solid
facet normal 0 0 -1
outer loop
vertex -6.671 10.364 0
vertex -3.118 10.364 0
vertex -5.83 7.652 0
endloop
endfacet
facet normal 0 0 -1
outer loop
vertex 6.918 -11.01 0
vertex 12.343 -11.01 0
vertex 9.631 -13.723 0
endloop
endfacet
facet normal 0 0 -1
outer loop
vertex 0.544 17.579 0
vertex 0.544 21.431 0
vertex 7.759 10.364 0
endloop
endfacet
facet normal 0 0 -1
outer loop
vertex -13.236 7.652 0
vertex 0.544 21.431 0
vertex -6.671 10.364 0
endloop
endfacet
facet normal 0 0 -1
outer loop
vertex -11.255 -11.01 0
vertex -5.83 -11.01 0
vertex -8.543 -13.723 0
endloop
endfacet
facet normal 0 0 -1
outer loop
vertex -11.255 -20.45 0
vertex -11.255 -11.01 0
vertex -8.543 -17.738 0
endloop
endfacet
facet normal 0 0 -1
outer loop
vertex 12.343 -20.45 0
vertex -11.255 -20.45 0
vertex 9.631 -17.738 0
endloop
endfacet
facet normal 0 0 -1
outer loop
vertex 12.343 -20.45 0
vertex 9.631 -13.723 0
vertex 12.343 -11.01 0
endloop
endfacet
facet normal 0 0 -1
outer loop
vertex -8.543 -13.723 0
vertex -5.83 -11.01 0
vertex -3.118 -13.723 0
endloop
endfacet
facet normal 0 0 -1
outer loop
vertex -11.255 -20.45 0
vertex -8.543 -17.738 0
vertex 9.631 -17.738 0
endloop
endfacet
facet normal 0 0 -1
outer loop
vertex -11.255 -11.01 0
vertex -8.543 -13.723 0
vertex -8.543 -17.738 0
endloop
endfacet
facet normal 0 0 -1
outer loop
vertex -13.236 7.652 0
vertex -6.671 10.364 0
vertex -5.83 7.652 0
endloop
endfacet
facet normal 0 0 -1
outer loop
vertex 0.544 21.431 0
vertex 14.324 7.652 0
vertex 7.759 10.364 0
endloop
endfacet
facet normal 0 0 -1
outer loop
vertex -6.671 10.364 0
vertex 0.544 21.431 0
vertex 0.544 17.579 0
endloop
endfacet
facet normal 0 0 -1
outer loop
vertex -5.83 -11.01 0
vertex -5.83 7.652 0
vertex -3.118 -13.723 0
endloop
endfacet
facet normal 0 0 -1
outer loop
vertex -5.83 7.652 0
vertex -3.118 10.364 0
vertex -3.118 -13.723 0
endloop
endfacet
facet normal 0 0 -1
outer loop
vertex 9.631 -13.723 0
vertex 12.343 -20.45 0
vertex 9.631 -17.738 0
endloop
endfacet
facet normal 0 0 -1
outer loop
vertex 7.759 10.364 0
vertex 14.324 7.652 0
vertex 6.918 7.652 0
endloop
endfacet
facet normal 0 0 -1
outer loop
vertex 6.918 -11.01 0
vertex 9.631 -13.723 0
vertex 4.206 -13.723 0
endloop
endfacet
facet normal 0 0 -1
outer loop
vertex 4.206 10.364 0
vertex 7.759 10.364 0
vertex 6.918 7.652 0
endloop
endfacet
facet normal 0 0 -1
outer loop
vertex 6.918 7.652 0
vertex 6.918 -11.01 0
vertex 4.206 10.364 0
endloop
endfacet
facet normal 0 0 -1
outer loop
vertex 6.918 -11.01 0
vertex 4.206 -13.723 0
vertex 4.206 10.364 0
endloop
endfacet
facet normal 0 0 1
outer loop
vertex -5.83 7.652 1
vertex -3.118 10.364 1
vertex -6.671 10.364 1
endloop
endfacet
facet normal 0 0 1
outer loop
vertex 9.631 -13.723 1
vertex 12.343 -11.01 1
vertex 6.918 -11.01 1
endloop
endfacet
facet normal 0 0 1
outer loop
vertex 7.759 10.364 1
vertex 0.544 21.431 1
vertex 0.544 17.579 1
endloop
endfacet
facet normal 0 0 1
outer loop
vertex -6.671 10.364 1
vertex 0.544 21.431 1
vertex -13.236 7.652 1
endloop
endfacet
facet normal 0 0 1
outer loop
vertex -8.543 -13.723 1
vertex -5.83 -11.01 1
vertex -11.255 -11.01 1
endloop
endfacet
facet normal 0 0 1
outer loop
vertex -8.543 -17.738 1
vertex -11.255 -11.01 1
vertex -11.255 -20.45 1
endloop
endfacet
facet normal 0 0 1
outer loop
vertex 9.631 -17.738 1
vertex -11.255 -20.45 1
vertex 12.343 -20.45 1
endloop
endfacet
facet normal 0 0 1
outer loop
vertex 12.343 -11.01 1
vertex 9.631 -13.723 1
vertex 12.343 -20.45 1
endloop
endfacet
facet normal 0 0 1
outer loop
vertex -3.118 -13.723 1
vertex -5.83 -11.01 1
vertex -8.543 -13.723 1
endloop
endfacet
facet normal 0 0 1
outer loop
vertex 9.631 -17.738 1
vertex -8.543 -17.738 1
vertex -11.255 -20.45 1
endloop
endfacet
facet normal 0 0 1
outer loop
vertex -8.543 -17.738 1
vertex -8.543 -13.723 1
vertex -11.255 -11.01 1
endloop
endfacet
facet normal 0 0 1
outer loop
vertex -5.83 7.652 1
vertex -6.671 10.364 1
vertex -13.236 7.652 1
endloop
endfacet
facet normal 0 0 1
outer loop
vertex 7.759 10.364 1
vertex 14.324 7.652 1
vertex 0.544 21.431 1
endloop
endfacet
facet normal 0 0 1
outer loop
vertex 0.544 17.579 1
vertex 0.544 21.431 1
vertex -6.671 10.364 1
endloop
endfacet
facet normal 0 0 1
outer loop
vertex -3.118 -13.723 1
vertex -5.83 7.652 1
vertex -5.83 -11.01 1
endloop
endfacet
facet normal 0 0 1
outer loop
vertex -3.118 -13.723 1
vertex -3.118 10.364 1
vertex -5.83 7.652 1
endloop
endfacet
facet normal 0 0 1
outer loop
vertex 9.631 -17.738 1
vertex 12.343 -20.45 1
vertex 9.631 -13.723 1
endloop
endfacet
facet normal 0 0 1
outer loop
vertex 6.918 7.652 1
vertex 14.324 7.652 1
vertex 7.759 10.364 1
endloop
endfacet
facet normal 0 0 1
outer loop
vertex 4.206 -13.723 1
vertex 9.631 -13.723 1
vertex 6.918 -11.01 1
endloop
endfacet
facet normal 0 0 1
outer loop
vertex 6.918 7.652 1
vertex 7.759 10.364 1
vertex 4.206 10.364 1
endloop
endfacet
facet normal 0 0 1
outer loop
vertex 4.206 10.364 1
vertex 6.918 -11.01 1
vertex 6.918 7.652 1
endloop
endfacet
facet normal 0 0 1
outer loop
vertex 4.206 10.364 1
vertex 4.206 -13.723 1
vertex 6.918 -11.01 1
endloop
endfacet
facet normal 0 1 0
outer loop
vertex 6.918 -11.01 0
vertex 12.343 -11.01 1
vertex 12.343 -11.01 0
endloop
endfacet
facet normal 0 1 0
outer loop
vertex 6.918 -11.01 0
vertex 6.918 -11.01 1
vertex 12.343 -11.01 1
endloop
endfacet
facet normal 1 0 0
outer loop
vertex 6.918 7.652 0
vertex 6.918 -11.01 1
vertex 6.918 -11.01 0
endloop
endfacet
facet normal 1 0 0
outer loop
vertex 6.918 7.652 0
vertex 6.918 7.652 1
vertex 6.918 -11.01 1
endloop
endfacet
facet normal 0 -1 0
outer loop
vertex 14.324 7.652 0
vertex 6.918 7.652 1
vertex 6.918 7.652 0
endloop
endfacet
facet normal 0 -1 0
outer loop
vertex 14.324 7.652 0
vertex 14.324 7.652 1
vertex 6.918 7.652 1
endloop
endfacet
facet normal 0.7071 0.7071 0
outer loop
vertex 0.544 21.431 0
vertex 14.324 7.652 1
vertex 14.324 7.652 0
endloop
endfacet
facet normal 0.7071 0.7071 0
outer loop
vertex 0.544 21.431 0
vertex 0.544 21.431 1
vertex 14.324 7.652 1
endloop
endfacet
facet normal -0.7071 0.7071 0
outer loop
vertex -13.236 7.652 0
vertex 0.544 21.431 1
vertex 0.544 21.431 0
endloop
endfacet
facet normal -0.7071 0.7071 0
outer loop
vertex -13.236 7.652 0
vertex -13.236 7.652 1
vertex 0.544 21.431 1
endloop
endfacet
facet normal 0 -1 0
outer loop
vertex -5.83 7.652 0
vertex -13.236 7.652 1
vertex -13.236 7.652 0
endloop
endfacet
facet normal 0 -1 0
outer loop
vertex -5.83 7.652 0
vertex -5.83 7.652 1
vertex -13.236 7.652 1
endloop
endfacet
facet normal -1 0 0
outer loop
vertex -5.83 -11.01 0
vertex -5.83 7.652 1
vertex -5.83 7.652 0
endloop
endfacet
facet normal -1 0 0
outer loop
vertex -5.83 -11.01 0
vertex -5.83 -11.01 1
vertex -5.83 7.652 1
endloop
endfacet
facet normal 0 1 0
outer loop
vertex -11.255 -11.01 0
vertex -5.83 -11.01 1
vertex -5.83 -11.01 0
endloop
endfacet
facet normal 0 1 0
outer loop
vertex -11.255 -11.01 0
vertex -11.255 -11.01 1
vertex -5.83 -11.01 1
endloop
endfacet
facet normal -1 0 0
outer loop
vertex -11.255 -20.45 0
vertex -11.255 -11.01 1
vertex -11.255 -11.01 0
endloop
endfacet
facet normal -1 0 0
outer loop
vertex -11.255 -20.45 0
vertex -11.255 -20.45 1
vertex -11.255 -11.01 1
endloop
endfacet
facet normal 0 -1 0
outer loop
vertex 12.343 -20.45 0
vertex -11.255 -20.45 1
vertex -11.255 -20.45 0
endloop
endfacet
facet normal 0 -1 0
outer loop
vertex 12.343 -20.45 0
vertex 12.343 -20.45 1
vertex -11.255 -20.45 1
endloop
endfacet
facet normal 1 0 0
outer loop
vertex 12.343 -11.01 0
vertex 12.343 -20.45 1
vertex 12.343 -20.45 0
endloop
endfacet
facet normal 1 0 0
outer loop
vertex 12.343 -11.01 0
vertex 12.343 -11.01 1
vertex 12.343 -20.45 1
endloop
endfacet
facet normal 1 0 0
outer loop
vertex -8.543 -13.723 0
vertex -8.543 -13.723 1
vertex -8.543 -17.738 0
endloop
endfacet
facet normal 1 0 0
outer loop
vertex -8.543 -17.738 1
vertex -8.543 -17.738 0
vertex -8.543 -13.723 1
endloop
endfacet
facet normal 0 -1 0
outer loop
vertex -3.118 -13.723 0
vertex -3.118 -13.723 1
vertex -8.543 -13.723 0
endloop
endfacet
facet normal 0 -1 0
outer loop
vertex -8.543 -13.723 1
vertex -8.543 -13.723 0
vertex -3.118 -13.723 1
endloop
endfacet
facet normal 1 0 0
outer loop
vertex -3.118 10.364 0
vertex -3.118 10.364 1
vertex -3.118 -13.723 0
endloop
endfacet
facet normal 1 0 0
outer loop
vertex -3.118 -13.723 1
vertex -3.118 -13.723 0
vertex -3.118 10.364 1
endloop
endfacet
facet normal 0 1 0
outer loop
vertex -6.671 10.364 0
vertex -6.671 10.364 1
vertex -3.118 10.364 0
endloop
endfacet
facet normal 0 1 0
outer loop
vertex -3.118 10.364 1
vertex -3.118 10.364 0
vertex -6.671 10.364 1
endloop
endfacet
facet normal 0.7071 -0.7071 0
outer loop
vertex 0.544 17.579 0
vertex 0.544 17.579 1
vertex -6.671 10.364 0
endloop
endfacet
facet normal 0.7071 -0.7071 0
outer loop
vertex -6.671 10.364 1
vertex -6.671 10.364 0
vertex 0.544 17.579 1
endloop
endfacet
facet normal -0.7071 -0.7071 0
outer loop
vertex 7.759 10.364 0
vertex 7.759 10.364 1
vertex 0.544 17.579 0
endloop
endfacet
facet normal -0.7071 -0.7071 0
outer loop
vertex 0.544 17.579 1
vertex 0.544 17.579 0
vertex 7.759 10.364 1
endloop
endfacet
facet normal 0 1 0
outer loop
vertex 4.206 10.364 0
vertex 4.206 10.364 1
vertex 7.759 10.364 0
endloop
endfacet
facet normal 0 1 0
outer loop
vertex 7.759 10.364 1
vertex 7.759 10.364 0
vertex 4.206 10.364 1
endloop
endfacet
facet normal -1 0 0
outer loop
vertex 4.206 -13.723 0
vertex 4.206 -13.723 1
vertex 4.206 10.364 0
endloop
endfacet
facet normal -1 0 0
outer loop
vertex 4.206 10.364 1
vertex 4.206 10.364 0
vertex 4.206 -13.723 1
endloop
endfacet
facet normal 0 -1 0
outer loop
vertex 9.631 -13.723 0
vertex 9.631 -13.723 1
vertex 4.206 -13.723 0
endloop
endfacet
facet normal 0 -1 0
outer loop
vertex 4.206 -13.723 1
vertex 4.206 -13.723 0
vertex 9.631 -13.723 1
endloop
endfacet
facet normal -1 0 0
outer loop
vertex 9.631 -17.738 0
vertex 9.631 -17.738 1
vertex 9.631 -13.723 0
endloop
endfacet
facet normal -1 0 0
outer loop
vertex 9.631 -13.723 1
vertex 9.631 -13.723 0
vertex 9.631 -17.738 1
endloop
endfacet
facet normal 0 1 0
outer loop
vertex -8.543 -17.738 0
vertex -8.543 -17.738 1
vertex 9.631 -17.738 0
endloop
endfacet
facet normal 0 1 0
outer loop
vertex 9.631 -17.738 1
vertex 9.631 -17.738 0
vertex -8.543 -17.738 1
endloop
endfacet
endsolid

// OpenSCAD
// -*- mode: SCAD ; c-file-style: "ellemtel" ; coding: utf-8 -*-
//
// NN
//
// Written by Roland Sieker <ospalh@gmail.com>
// Licence: CC-0
// Have fun

/* [Global] */

// ... to preview. You will get all parts when you click "Create Thing".
part = "arrow"; // [NN: foo, bar: baz]

// Set this to "render" and click on "Create Thing" when done with the setup.
preview = 1; // [0:render, 1:preview]

/* [Sizes] */

// bla bla
size_x = 15;  // [1:0.1:40]

/* [Hidden] */

// Done with the customizer

// *******************************************************
// Extra parameters. These can be changed reasonably safely.


w = 1.8;  // Wall width
p = 1.2;  // Bottom, top plate height
c = 0.4;  // Clearance
angle = 60; // Overhangs much below 60 degrees are a problem for me

// *******************************************************
// Some shortcuts. These shouldn't be changed

tau = 2 * PI;  // pi is still wrong. tau = circumference / r

xy_factor = 1/tan(angle);
// To get from a height to a horizontal width inclined correctly
z_factor = tan(angle);  // The other way around


some_distance = 50;
ms = 0.01;  // Muggeseggele.

// fn for differently sized objects and fs, fa; all for preview or rendering.
pna = 40;
pnb = 15;
pa = 5;
ps = 1;
rna = 180;
rnb = 30;
ra = 1;
rs = 0.1;
function na() = (preview) ? pna : rna;
function nb() = (preview) ? pnb : rnb;
$fs = (preview) ? ps : rs;
$fa = (preview) ? pa : ra;

// *******************************************************
// End setup



// *******************************************************
// Generate the parts

print_part();
// preview_parts();
// stack_parts();



module print_part()
{
   if ("arrow" == part)
   {
      arrow();
   }
   if ("foo" == part)
   {
      foo();
   }
}

module preview_parts()
{
   nn();
   translate([some_distance, 0, 0])
   {
      foo();
   }
}

module stack_parts()
{
   // intersection()
   {
      color("yellow")
      {
         foo();
      }
      translate([0,0,30])
      {
         color("red")
         {
            NN();
         }
      }
   }
}

// *******************************************************
// Code for the parts themselves


module arrow()
{

   linear_extrude(1, convexity=8)
   {
      text(
         text="⇫", font="Symbola:style=Regular",
         valign="center", halign="center", size=40);
   }
}
